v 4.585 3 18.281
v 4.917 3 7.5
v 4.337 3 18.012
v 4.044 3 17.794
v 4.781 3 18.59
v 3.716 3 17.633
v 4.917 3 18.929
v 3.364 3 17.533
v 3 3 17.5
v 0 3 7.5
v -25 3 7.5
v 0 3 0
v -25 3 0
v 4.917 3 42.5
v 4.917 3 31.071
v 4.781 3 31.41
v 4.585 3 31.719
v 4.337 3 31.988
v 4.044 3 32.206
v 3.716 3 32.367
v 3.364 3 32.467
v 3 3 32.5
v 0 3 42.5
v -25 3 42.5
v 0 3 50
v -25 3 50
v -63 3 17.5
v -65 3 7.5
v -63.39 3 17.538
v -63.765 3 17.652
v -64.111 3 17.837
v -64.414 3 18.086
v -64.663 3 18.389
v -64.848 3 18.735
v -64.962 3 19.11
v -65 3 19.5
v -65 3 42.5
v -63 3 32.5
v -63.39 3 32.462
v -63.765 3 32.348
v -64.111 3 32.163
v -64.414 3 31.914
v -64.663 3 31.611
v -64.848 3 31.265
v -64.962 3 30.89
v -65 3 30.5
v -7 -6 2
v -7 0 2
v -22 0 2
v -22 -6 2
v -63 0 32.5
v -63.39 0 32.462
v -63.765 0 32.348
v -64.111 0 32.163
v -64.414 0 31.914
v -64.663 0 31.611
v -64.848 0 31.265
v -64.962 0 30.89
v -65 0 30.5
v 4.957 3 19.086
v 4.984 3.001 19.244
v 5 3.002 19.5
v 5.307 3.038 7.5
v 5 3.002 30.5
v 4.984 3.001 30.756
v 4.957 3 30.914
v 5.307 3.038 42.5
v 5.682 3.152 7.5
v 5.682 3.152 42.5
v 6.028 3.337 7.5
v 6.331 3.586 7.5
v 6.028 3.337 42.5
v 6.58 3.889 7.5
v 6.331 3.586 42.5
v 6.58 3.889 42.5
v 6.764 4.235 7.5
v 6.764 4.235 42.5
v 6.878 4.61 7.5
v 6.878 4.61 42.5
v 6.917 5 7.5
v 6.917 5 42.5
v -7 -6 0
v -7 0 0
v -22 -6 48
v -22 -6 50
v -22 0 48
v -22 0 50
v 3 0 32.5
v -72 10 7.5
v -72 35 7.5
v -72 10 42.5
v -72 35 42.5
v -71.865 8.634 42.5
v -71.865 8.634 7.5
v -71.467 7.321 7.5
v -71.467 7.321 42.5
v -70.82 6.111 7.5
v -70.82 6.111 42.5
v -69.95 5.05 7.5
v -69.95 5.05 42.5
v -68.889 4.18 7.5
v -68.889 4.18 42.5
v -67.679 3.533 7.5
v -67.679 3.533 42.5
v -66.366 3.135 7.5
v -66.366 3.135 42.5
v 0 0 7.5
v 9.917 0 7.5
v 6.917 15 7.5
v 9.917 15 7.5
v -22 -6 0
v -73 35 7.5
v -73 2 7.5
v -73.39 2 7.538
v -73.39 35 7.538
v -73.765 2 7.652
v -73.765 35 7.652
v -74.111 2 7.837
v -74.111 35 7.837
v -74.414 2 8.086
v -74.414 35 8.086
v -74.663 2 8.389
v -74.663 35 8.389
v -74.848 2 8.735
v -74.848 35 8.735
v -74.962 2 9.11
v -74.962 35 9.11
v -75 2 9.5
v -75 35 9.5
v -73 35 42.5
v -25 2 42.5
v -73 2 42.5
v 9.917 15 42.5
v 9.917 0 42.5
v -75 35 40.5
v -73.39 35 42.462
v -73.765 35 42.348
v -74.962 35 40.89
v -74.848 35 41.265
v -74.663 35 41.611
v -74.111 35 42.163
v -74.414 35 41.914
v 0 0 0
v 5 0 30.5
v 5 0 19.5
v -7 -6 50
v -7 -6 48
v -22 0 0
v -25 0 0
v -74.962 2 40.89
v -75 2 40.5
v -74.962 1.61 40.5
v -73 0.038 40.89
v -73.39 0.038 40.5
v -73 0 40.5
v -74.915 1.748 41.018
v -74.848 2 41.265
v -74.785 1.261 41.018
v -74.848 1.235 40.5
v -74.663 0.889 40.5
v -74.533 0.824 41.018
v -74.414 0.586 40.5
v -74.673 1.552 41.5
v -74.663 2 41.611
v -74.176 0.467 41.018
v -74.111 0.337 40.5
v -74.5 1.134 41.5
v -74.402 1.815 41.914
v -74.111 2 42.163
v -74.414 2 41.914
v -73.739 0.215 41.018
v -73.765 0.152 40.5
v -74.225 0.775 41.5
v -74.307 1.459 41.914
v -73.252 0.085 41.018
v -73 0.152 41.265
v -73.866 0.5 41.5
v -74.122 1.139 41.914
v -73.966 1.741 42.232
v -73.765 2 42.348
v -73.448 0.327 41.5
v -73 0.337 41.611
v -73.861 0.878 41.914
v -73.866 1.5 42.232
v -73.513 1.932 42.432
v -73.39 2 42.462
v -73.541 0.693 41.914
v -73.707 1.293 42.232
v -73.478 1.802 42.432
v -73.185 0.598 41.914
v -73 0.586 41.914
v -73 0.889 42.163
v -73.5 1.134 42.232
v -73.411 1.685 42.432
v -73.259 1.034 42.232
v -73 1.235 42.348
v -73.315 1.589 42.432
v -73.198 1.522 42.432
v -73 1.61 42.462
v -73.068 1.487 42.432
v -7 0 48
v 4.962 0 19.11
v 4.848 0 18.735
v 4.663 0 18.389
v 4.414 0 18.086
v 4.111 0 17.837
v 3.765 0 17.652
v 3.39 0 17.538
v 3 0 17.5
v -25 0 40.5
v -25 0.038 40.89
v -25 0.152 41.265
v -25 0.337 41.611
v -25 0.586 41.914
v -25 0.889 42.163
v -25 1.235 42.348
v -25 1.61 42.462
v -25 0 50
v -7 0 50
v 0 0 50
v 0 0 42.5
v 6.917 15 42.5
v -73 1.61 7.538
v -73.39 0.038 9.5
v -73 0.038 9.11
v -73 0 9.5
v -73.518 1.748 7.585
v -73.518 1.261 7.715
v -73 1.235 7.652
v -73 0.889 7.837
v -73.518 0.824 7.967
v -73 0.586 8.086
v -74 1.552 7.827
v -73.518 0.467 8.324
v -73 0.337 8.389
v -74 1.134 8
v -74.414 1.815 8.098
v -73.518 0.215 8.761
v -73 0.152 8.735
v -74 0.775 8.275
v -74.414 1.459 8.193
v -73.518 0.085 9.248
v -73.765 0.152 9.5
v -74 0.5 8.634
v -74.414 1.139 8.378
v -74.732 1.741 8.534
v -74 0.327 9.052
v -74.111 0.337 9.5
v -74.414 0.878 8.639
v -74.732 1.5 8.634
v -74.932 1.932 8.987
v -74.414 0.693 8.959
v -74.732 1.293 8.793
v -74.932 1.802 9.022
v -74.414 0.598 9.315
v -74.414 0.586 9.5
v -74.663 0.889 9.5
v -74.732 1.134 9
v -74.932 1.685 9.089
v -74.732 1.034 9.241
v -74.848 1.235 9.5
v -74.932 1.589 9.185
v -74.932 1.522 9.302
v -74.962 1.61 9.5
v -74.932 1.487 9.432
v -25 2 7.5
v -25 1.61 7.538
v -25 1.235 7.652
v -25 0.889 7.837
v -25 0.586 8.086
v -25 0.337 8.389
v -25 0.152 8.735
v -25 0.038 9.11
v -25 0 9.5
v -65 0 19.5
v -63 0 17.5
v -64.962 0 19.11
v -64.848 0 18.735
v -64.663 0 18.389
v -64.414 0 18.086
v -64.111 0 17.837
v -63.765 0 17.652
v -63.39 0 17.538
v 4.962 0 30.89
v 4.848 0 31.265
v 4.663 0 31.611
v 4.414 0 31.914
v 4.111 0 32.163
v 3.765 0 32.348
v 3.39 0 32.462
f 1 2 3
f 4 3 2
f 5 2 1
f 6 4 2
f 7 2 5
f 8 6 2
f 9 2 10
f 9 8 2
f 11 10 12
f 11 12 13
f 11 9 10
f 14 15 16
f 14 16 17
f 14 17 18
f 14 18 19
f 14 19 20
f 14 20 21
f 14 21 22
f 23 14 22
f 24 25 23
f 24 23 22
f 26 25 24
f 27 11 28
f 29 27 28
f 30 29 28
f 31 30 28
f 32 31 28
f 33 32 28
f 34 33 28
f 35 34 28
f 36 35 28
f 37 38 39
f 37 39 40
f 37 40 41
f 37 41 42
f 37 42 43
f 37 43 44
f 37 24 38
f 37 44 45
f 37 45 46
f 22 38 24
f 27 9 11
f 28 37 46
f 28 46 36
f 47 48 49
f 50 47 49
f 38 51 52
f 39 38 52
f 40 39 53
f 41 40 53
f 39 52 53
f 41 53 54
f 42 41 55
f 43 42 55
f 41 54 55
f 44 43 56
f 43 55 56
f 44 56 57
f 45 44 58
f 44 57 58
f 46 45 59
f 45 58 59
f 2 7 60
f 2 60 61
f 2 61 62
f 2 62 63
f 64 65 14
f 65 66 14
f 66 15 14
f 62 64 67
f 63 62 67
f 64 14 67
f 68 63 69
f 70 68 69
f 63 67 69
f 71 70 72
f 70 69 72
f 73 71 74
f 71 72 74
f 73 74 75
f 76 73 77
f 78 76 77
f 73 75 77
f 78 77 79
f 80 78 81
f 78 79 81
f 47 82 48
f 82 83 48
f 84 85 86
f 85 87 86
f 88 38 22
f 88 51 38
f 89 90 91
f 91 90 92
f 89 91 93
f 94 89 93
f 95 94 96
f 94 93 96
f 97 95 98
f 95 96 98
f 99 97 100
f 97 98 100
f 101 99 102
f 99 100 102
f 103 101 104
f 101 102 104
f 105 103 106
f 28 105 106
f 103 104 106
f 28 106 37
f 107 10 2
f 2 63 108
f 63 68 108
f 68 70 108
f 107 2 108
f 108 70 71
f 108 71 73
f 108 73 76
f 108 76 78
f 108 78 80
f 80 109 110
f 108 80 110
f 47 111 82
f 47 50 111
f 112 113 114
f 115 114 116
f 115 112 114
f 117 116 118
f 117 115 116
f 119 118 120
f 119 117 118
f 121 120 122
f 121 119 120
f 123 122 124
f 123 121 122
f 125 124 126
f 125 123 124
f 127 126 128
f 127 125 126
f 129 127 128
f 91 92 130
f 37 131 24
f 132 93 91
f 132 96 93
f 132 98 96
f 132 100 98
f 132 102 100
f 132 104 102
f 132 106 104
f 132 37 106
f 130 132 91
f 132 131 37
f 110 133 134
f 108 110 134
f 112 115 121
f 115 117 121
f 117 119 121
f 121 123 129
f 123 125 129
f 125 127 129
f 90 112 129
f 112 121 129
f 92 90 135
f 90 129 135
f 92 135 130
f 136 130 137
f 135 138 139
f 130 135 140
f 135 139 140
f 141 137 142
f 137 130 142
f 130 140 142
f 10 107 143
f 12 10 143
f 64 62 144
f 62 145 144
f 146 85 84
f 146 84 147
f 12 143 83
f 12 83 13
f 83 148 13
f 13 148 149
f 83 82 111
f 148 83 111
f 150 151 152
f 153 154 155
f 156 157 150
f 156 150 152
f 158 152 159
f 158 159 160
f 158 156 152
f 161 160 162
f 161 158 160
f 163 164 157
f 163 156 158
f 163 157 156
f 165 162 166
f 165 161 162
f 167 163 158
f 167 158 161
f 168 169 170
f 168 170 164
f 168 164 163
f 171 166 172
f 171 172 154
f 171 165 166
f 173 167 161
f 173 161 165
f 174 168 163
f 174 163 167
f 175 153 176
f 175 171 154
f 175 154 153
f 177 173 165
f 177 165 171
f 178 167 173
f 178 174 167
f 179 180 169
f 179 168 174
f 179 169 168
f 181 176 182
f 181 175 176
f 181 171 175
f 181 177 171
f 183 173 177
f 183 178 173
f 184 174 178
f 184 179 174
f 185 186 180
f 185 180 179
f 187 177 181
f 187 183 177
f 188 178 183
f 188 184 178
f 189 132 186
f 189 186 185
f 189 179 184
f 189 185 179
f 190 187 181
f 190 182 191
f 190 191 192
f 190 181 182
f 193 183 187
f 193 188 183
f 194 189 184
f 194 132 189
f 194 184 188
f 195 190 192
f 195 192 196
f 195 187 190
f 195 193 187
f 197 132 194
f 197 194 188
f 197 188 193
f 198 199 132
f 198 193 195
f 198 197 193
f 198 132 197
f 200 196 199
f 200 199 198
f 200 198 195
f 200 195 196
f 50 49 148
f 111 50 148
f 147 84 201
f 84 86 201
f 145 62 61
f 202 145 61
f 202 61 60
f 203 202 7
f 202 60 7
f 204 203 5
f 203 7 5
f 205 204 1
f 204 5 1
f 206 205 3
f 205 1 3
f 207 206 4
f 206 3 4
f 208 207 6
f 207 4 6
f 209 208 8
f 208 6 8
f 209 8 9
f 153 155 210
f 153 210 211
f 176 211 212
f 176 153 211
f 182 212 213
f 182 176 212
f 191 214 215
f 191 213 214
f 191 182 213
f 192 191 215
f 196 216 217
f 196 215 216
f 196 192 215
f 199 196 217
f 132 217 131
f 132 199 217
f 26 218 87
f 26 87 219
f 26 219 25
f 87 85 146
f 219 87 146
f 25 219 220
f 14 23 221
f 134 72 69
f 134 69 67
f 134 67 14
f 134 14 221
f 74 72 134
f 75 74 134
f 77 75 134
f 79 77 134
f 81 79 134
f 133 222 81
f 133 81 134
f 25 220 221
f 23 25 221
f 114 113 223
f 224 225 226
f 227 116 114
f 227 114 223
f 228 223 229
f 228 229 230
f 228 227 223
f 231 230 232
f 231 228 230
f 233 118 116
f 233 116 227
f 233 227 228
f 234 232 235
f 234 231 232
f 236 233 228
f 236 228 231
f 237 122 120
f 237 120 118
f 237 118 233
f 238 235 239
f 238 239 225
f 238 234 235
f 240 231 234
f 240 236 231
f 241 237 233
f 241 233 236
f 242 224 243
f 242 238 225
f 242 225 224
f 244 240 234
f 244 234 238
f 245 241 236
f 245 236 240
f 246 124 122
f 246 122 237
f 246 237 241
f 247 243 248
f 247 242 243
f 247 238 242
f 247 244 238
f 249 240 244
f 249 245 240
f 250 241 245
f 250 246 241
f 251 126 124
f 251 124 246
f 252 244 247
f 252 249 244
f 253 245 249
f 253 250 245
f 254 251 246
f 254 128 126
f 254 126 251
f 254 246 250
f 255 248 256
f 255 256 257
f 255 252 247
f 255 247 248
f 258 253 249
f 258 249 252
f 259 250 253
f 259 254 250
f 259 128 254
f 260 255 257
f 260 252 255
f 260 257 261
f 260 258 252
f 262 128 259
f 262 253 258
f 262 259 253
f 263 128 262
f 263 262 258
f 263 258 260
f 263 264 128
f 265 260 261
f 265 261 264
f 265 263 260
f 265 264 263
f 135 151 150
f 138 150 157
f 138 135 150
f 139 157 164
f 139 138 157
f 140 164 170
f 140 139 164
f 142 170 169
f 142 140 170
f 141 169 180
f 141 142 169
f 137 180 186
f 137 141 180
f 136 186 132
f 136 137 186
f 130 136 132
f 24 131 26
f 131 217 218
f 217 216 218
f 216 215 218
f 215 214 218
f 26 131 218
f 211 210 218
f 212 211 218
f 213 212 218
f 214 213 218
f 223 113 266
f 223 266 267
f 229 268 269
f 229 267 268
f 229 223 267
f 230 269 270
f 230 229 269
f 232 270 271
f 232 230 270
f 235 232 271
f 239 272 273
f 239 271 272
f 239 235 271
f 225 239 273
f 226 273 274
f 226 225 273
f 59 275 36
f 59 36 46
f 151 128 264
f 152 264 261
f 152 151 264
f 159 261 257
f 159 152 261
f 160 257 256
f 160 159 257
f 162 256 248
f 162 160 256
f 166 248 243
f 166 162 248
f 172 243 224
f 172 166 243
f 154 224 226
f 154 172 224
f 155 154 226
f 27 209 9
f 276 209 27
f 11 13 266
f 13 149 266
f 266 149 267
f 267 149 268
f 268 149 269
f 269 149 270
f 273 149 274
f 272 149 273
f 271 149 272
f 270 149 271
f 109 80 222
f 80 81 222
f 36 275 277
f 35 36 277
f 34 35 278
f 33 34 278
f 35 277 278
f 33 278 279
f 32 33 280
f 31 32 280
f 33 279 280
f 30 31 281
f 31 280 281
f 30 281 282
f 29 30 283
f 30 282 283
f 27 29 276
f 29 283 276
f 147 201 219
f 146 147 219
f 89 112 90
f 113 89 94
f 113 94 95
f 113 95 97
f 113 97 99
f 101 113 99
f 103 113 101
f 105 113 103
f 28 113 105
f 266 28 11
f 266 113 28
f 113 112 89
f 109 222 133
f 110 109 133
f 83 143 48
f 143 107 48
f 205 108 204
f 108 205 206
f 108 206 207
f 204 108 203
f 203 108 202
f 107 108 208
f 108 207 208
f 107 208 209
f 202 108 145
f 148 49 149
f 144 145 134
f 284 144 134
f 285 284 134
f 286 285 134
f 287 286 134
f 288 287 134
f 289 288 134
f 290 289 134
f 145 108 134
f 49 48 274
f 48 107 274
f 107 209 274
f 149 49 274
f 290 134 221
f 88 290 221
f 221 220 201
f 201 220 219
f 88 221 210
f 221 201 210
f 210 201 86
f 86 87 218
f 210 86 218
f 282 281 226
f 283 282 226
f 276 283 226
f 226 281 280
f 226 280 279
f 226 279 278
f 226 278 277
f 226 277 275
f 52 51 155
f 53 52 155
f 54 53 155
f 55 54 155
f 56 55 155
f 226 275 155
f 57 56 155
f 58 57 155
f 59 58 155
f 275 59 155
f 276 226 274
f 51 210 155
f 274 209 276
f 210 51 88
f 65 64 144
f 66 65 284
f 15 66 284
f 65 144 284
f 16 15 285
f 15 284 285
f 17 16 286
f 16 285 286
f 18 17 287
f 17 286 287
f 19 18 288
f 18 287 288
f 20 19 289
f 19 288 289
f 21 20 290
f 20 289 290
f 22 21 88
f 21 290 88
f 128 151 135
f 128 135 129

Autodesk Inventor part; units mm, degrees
ref_plane "YZ Plane" through (0, 0, 0) normal (1, 0, 0) x (0, 1, 0)
ref_plane "XZ Plane" through (0, 0, 0) normal (0, 1, 0) x (-1, 0, 0)
ref_plane "XY Plane" through (0, 0, 0) normal (0, 0, 1) x (1, 0, 0)
sketch "Skizze1" plane through (0, 0, 0) normal (0, 1, 0) x (-1, 0, 0)
  line L0 (0, 0) -> (25, 0)
  line L1 (25, 50) -> (0, 50)
  line L2 (0, 42.5) -> (-9.9167, 42.5)
  line L3 (-9.9167, 42.5) -> (-9.9167, 7.5)
  line L4 (-9.9167, 7.5) -> (0, 7.5)
  line L5 (65, 32.5) -> (-5, 32.5)
  line L6 (-5, 32.5) -> (-5, 17.5)
  line L7 (-5, 17.5) -> (65, 17.5)
  line L8 (65, 17.5) -> (65, 32.5)
  line L9 (0, 7.5) -> (0, 17.5)
  line L10 (0, 32.5) -> (0, 42.5)
  line L11 (0, 50) -> (0, 32.5)
  line L12 (0, 17.5) -> (0, 0)
  line L13 (25, 42.5) -> (75, 42.5)
  line L14 (75, 42.5) -> (75, 7.5)
  line L15 (75, 7.5) -> (25, 7.5)
  line L16 (25, 0) -> (25, 17.5)
  line L17 (25, 32.5) -> (25, 50)
  dimension "d0" = 50
  dimension "d1" = 25
  dimension "d2" = 7.5
  dimension "d4" = 35
  dimension "d5" = 10
  dimension "d6" = 15
  dimension "d8" = 70
  dimension "d9" = 65
  dimension "d26" = 50
  dimension "d27" = 35
  dimension "d28" = 7.5
extrude "Extrusion1" add sketch "Skizze1" along normal blind 3 contours L12 L9 L7 L16 L0 | L4 L3 L2 L10 L5 L6 L7 L9 | L16 L7 L8 L5 L17 L13 L14 L15 | L11 L1 L17 L5 L10
sketch "Skizze2" plane through (0, 0, 42.5) normal (0, 0, 1) x (1, 0, 0)
  line L0 (9.9167, 0) -> (9.9167, 3) projected
  line L1 (9.9167, 3) -> (6.9167, 3)
  line L2 (6.9167, 3) -> (6.9167, 15)
  line L3 (6.9167, 15) -> (9.9167, 15)
  line L4 (9.9167, 15) -> (9.9167, 3)
  point P0 (0, 0)
  dimension "d12" = 3
  dimension "d13" = 12
extrude "Extrusion2" add sketch "Skizze2" against normal up to surface (35 mm away)
fillet "Rundung1" radius 2 1 edges at (6.9167, 3, 25)
sketch "Skizze3" plane through (0, 0, 0) normal (0, -1, 0) x (1, 0, 0)
  line L0 (-22, 0) -> (-7, 0)
  line L1 (-7, 0) -> (-7, 2)
  line L2 (-7, 2) -> (-22, 2)
  line L3 (-22, 2) -> (-22, 0)
  line L4 (-22, 48) -> (-7, 48)
  line L5 (-7, 48) -> (-7, 50)
  line L6 (-7, 50) -> (-22, 50)
  line L7 (-22, 50) -> (-22, 48)
  line L8 (-25, 50) -> (0, 50) projected
  line L9 (0, 50) -> (0, 42.5) projected
  point P0 (0, 0)
  point P1 (0, 32.5)
  dimension "d17" = 2
  dimension "d18" = 2
  dimension "d19" = 46
  dimension "d20" = 15
  dimension "d21" = 15
  dimension "d22" = 0
  dimension "d23" = 7
extrude "Extrusion3" add sketch "Skizze3" along normal blind 6
sketch "Skizze4" plane through (-75, 0, 7.5) normal (-1, 0, 0) x (0, 0, 1)
  line L0 (0, 0) -> (0, 35)
  line L1 (0, 35) -> (35, 35)
  line L2 (35, 0) -> (35, 15) projected
  line L3 (35, 35) -> (35, 0)
  line L4 (0, 0) -> (0, 15) projected
  line L5 (35, 0) -> (0, 0)
  point P0 (-7.5, 0)
  dimension "d29" = 35
extrude "Extrusion4" add sketch "Skizze4" against normal blind 3
fillet "Rundung2" radius 7 1 edges at (-72, 3, 25)
fillet "Rundung3" radius 2 7 edges at (-50, 0, 42.5) (-75, 0, 25) (-50, 0, 7.5) (-65, 1.5, 17.5) (-65, 1.5, 32.5) (5, 1.5009, 32.5) (5, 1.5009, 17.5)
fillet "Rundung4" radius 2 4 edges at (-74.4142, 0.5858, 41.9142) (-75, 18.5, 42.5) (-74.4142, 0.5858, 8.0858) (-75, 18.5, 7.5)
properties part number "Ultrasonic" material "Stahl, Guss"
